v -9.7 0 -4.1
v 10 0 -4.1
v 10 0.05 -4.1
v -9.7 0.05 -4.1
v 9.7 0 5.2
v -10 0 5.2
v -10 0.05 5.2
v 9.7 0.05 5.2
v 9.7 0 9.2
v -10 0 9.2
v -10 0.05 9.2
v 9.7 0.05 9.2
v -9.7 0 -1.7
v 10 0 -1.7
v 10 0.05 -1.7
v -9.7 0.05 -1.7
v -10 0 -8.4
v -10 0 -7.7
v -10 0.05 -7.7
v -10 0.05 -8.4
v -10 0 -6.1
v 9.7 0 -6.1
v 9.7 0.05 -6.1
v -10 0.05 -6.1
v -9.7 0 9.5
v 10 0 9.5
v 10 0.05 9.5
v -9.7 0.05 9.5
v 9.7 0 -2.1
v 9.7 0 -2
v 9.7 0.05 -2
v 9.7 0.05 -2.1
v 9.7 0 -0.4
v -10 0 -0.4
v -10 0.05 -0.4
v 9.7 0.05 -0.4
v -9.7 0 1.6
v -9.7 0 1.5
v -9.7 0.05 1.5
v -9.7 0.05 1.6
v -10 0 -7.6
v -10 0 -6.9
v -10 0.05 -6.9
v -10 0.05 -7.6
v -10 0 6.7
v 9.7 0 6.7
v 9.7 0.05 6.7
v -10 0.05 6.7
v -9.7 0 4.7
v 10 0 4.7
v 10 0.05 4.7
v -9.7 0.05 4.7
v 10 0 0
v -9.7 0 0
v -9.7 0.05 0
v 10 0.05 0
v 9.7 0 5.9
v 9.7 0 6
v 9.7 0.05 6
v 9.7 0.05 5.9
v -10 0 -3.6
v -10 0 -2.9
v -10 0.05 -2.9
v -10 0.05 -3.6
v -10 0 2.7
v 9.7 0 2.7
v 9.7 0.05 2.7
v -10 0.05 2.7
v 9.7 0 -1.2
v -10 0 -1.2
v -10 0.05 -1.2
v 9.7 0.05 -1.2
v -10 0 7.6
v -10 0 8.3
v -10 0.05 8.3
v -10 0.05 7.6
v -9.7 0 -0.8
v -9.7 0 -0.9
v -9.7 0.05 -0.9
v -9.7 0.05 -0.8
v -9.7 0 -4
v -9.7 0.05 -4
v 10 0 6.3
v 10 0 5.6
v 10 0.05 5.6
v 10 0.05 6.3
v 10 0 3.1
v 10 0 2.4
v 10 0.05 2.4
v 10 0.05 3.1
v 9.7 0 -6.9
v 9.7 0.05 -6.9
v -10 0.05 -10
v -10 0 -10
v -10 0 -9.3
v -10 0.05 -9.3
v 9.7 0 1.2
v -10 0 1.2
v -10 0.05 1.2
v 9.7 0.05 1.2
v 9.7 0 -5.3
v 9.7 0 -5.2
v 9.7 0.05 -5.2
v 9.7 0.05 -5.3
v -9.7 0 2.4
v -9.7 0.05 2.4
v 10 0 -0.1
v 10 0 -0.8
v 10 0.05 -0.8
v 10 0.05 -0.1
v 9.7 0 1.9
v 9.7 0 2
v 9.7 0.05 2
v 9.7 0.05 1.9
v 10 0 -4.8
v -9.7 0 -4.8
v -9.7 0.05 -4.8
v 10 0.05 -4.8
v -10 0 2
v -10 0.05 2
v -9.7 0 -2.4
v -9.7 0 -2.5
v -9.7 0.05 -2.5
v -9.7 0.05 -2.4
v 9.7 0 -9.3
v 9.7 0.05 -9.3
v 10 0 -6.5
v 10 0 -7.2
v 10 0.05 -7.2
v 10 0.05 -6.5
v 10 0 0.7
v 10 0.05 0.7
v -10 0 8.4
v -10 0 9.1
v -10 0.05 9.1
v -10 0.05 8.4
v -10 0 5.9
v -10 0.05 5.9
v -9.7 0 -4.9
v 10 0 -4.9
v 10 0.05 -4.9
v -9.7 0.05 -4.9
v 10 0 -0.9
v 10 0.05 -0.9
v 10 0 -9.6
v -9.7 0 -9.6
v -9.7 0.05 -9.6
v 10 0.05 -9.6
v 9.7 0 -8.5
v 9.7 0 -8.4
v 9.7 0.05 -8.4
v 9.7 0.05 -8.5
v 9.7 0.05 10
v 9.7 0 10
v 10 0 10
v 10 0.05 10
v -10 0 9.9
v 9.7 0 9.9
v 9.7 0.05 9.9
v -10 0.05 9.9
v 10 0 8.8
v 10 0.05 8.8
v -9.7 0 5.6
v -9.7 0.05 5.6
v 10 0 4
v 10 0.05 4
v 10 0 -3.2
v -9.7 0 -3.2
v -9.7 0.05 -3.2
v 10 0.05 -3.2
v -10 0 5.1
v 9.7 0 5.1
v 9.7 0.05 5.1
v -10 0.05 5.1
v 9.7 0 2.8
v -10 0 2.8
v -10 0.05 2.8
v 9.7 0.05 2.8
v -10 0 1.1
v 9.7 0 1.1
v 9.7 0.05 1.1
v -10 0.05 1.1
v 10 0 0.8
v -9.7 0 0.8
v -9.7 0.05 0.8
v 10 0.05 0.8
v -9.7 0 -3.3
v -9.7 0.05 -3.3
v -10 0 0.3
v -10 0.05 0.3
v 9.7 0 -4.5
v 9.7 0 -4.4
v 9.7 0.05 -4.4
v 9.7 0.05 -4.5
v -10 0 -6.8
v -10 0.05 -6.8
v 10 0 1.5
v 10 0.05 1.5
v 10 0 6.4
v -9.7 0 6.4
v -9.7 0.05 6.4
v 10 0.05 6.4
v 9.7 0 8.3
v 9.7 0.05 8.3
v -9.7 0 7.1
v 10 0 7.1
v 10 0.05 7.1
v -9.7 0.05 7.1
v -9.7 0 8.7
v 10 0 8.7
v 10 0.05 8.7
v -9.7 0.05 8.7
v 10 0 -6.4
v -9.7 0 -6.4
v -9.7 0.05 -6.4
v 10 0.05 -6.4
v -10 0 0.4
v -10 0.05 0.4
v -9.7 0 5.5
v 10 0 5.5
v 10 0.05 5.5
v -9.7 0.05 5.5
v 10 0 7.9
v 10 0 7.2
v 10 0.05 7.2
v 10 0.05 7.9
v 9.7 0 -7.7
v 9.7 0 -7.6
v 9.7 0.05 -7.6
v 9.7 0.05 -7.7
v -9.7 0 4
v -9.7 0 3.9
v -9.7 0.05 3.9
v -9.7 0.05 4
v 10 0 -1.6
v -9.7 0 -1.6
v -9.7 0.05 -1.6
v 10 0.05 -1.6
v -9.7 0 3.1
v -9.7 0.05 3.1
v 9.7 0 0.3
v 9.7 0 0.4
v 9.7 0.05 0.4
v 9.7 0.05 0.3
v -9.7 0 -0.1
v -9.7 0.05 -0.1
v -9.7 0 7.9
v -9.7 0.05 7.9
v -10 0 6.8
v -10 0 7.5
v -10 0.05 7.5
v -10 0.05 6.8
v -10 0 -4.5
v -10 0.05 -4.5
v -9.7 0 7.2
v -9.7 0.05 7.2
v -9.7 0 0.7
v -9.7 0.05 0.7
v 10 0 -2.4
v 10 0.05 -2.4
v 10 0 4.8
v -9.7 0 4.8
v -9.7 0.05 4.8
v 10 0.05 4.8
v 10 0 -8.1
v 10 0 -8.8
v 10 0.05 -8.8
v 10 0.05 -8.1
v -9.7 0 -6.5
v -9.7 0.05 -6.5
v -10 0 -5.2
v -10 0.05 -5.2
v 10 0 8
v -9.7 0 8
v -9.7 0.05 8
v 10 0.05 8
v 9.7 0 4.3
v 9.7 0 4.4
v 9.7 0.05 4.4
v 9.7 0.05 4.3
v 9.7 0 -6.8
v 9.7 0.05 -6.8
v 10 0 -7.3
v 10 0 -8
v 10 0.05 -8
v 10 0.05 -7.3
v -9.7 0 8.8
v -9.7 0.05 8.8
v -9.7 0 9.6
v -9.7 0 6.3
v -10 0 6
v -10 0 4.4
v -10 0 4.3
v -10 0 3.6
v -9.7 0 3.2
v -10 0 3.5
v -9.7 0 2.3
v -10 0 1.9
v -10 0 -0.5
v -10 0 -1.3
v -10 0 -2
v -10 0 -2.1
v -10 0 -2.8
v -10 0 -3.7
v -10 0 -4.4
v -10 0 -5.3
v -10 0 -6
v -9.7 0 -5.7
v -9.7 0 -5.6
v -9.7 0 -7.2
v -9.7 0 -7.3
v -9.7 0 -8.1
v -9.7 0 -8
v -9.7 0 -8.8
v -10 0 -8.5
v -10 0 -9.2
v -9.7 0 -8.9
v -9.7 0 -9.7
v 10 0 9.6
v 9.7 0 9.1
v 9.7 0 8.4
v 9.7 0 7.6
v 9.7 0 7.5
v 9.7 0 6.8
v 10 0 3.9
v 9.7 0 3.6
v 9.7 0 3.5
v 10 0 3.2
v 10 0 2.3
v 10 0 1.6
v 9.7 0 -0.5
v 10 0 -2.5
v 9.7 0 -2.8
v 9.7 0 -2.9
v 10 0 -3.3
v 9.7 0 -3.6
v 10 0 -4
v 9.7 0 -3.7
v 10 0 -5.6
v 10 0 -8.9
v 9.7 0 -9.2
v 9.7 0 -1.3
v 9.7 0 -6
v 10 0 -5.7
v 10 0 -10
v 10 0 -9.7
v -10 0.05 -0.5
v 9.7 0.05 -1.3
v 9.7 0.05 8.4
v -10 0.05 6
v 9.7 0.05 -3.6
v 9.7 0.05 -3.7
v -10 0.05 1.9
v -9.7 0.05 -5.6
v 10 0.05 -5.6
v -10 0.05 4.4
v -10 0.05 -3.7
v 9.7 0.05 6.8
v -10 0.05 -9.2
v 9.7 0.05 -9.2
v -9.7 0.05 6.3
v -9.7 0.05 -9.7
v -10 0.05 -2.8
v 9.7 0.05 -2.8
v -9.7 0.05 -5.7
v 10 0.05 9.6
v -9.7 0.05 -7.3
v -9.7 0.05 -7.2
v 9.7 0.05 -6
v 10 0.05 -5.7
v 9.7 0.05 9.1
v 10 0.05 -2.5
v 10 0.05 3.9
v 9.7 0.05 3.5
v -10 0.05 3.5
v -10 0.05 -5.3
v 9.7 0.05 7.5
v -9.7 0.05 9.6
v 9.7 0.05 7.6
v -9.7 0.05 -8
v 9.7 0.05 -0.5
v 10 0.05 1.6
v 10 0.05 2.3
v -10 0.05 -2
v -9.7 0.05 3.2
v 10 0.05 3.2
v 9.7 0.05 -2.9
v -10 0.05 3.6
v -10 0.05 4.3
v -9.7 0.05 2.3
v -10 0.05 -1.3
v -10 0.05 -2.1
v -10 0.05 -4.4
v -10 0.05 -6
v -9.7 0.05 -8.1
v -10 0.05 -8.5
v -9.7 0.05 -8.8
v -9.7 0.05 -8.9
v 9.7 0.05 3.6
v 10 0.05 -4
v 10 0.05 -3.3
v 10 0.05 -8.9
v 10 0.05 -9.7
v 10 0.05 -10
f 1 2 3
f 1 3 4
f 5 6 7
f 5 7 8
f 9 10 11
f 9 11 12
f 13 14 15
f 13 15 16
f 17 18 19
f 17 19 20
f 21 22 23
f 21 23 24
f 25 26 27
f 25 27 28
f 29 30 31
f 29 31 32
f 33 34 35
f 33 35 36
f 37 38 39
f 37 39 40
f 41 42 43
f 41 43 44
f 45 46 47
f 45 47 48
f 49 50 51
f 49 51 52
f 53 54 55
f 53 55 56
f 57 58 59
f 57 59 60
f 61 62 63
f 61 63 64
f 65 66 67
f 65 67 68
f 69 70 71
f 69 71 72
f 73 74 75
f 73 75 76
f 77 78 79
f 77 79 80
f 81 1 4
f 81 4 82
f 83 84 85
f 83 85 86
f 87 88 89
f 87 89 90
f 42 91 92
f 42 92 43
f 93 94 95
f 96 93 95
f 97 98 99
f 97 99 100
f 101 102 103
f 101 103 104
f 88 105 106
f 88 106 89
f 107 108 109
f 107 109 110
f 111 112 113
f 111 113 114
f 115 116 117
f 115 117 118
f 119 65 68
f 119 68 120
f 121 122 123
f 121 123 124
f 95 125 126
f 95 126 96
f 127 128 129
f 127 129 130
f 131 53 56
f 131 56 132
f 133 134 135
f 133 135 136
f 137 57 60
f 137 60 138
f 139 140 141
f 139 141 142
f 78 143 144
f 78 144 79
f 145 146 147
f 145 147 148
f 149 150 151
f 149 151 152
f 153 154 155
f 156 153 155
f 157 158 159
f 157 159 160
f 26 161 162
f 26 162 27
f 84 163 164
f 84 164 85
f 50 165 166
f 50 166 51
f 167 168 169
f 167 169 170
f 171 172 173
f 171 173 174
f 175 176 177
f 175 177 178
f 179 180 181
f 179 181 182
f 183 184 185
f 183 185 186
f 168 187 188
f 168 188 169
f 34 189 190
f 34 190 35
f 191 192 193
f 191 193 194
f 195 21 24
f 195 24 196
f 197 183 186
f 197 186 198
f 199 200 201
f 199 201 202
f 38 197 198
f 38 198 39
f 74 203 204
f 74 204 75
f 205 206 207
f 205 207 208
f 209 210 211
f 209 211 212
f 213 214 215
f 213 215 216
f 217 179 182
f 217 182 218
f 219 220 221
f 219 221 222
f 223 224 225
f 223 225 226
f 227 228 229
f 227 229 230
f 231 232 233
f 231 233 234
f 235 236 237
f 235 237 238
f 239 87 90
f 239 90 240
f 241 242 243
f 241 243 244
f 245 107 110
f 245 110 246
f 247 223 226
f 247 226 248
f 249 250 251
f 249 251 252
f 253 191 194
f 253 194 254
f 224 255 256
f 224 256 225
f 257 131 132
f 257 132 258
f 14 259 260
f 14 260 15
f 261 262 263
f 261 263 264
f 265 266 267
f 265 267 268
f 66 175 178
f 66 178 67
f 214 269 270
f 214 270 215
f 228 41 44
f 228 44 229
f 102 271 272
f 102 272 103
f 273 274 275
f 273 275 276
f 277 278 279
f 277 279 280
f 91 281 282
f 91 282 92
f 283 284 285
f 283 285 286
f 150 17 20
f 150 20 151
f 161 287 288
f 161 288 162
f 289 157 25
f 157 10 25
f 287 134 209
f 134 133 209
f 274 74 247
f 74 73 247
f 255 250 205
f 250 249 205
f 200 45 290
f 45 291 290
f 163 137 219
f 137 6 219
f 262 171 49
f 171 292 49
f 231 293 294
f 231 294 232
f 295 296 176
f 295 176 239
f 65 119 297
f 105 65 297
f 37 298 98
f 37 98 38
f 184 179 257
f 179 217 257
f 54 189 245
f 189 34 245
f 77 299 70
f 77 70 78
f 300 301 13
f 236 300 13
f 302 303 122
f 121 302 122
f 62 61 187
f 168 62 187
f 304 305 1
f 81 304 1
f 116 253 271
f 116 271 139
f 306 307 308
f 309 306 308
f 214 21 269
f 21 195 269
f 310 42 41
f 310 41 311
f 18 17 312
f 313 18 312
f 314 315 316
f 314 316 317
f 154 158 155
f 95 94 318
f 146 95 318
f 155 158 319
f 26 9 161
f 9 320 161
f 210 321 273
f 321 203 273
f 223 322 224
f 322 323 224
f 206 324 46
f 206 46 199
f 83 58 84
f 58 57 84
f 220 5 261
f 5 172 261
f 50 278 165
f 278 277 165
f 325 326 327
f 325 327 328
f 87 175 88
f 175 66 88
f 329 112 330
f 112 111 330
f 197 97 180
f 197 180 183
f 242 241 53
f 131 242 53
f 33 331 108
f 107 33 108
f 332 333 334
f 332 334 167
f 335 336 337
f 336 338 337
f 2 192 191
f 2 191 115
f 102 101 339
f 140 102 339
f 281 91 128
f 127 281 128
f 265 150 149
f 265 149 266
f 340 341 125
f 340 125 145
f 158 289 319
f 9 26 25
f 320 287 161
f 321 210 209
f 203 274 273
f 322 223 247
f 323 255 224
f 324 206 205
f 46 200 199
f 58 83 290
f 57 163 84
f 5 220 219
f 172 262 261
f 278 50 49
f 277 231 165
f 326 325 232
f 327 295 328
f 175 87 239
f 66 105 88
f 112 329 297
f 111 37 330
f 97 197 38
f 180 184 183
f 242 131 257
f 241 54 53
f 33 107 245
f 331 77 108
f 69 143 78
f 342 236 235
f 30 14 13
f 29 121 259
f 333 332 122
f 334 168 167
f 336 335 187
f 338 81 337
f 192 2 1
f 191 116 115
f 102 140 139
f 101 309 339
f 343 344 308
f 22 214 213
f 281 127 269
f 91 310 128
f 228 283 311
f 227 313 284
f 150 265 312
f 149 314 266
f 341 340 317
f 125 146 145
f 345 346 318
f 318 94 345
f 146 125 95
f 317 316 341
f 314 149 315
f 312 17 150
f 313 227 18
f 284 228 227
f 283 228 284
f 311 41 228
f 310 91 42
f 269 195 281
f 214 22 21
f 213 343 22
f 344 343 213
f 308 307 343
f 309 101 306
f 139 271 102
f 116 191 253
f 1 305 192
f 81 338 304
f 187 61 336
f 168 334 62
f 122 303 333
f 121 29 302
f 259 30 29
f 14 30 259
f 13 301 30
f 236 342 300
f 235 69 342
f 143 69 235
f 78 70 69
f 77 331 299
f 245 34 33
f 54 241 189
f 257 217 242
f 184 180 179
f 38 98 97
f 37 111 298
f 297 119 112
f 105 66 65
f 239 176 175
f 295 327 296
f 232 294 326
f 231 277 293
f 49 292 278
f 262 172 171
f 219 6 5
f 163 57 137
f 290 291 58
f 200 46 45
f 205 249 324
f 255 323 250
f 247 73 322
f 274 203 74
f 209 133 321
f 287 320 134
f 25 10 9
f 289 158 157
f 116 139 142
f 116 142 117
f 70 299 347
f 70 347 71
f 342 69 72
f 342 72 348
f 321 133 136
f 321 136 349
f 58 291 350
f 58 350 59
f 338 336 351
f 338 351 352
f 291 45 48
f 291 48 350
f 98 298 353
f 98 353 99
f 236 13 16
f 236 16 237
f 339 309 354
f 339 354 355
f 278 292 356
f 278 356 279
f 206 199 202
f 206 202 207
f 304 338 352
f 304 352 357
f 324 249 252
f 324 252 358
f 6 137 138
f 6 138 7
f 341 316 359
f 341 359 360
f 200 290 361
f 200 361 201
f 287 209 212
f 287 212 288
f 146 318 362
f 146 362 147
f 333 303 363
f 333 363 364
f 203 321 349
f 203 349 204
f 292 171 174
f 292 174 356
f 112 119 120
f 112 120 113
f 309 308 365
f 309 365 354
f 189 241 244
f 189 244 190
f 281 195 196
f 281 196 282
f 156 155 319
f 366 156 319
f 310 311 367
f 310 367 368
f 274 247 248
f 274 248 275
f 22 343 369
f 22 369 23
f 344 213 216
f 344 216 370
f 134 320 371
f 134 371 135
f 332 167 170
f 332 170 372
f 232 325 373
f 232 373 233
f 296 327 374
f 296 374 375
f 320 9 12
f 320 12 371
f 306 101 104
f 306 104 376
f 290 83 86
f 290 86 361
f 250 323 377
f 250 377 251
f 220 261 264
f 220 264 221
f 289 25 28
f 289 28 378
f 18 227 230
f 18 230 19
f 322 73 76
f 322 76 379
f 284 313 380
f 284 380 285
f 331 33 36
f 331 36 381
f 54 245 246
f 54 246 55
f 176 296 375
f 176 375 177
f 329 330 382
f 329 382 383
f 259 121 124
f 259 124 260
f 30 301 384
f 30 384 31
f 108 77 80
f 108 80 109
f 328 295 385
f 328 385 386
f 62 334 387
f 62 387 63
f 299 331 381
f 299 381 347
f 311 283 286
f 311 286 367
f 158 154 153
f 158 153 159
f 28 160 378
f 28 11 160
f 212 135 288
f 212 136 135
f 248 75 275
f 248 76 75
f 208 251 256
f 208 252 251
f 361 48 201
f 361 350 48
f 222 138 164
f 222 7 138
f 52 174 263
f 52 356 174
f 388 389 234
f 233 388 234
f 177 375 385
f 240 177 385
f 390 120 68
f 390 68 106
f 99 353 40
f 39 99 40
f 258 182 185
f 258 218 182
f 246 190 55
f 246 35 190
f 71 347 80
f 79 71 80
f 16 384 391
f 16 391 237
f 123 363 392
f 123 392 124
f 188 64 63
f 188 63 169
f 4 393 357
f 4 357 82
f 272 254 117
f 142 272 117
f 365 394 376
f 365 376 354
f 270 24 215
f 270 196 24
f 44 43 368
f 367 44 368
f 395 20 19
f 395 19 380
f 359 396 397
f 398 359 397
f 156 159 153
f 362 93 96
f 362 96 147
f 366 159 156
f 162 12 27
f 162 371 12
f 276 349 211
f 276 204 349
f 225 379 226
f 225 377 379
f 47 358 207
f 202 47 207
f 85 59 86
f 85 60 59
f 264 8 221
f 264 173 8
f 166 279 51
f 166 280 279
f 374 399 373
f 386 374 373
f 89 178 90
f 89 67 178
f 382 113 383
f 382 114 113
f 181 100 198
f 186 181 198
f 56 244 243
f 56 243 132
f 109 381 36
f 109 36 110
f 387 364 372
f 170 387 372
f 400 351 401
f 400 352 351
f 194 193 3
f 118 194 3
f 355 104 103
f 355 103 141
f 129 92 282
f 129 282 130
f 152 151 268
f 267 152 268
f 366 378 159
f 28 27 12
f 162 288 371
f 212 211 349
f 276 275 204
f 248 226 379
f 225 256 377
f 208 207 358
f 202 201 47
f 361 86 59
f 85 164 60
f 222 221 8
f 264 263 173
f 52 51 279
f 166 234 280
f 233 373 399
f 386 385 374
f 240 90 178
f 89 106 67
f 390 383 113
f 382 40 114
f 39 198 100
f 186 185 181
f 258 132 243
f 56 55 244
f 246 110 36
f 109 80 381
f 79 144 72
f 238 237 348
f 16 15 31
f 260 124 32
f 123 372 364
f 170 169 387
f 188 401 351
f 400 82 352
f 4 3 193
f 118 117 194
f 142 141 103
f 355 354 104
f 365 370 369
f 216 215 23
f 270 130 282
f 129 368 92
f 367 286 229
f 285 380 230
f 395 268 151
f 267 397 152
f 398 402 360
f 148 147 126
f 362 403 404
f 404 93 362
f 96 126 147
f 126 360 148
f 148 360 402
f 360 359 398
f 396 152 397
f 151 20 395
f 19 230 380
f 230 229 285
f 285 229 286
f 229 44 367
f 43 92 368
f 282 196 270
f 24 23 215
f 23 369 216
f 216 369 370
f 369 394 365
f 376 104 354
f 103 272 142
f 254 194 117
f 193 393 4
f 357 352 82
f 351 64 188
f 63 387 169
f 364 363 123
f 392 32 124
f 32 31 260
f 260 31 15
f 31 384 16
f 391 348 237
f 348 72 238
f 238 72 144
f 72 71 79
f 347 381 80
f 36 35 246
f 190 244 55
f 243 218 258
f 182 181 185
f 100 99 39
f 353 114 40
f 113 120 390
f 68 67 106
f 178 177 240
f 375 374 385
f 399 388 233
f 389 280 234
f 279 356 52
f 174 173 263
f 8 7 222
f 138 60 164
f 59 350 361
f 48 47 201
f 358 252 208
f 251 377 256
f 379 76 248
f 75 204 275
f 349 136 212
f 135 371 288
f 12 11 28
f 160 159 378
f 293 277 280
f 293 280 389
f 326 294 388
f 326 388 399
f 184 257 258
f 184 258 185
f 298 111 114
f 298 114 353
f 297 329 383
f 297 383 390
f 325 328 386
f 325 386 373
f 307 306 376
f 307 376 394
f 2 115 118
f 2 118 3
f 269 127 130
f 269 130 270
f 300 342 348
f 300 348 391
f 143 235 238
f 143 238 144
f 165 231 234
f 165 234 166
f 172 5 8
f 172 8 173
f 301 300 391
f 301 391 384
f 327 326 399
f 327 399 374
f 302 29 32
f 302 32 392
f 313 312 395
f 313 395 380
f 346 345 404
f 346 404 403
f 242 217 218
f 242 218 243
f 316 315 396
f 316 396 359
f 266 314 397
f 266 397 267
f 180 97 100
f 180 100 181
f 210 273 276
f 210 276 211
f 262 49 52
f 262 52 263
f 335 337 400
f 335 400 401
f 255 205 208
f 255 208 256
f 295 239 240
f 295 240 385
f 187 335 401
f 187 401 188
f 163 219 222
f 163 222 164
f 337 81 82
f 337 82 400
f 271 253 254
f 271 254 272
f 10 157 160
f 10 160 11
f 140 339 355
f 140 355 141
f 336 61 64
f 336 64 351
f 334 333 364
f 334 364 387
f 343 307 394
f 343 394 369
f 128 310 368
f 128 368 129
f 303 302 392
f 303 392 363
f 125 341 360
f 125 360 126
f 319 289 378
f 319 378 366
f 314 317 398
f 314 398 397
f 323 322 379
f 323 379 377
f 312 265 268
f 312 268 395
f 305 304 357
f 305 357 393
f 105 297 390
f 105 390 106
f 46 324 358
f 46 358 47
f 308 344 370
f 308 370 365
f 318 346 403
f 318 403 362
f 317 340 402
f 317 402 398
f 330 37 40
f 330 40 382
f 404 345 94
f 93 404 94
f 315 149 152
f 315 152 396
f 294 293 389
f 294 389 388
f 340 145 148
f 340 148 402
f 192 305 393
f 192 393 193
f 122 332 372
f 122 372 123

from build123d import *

# Parameters (mm, degrees)
EXTRUDED_OBJECT_DEPTH = 0.05
BOSS_EXTRUDE1_DEPTH   = 0.05
LPATTERN2_COUNT       = 24
LPATTERN2_PITCH       = 0.8
SKETCH4_W             = 0.3
SKETCH4_H             = 0.1
BOSS_EXTRUDE2_DEPTH   = 0.05


with BuildPart() as part:
    # TopBlock → Extruded object (new body)
    with BuildSketch(Plane(origin=(0, 0, 0), x_dir=(1, 0, 0), z_dir=(0, 1, 0))):
        Polygon((-10, 10), (-9.7, 10), (10, 10), (10, 9.7), (-9.7, 9.7), (-9.7, 9.6), (10, 9.6), (10, 9.3), (-10, 9.3), (-10, 9.6), (-10, 9.7), align=None)
    extrude(amount=EXTRUDED_OBJECT_DEPTH)

    # Sketch3 → Boss-Extrude1 (add)
    with BuildSketch(Plane(origin=(0, 0, 0), x_dir=(1, 0, 0), z_dir=(0, 1, 0))):
        Polygon((9.7, 9.2), (9.7, 9.3), (10, 9.3), (10, 8.9), (-9.7, 8.9), (-9.7, 8.8), (10, 8.8), (10, 8.5), (-10, 8.5), (-10, 9.2), align=None)
    boss_extrude1 = extrude(amount=BOSS_EXTRUDE1_DEPTH)

    # LPattern2: Boss-Extrude1 ×24
    with Locations(*[(0, 0, i * LPATTERN2_PITCH) for i in range(1, LPATTERN2_COUNT)]):
        add(boss_extrude1)

    # Sketch4 → Boss-Extrude2 (add)
    with BuildSketch(Plane(origin=(0, 0, 0), x_dir=(1, 0, 0), z_dir=(0, 1, 0))):
        with Locations((9.85, -9.95)):
            Rectangle(SKETCH4_W, SKETCH4_H)
    extrude(amount=BOSS_EXTRUDE2_DEPTH)


solid = part.part
